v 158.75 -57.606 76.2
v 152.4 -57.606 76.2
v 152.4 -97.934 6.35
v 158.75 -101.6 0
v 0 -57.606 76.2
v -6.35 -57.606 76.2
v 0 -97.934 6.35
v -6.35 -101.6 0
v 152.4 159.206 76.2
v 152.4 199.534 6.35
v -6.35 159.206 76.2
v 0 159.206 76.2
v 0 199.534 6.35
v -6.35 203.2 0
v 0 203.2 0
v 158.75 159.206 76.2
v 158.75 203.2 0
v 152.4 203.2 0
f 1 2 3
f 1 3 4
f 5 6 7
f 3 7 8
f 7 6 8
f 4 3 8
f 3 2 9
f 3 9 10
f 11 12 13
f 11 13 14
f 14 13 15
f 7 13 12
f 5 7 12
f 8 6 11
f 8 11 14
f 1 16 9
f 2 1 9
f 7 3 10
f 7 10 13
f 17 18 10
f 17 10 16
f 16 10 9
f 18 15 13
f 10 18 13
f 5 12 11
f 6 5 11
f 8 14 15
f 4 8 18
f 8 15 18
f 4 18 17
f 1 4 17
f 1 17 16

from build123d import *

# Parameters (mm, degrees)
F1_DEPTH = 152.4
F3_DEPTH = 6.35
F5_DEPTH = 6.35
F7_DEPTH = 101.6
F9_DEPTH = 165.1


with BuildPart() as f1:
    # F0 (on Right) → F1 (new body)
    with BuildSketch(Plane.YZ):
        Polygon((0, 6.35), (0, 0), (203.2, 0), (199.533826, 6.35), align=None)
    extrude(amount=F1_DEPTH)

    # F2 (on face) → F3 (join)
    with BuildSketch(Plane.YZ.offset(152.4)):
        Polygon((0, 0), (203.2, 0), (159.205909, 76.2), (0, 76.2), align=None)
    extrude(amount=F3_DEPTH)

    # F4 (on face) → F5 (join)
    with BuildSketch(Plane(origin=(0, 0, 0), x_dir=(0, -1, 0), z_dir=(-1, 0, 0))):
        Polygon((-159.205909, 76.2), (-203.2, 0), (0, 0), (0, 76.2), align=None)
    extrude(amount=F5_DEPTH)

    # F6 (on face) → F7 (join)
    with BuildSketch(Plane.XZ):
        Polygon((152.4, 76.2), (152.4, 6.35), (0, 6.35), (0, 76.2), (-6.35, 76.2), (-6.35, 0), (158.75, 0), (158.75, 76.2), align=None)
    extrude(amount=F7_DEPTH)

    # F8 (on face) → F9 (cut)
    with BuildSketch(Plane(origin=(-6.35, 0, 0), x_dir=(0, -1, 0), z_dir=(-1, 0, 0))):
        Polygon((57.605909, 76.2), (101.6, 0), (101.6, 76.2), align=None)
    extrude(amount=-F9_DEPTH, mode=Mode.SUBTRACT)


solid = f1.part
